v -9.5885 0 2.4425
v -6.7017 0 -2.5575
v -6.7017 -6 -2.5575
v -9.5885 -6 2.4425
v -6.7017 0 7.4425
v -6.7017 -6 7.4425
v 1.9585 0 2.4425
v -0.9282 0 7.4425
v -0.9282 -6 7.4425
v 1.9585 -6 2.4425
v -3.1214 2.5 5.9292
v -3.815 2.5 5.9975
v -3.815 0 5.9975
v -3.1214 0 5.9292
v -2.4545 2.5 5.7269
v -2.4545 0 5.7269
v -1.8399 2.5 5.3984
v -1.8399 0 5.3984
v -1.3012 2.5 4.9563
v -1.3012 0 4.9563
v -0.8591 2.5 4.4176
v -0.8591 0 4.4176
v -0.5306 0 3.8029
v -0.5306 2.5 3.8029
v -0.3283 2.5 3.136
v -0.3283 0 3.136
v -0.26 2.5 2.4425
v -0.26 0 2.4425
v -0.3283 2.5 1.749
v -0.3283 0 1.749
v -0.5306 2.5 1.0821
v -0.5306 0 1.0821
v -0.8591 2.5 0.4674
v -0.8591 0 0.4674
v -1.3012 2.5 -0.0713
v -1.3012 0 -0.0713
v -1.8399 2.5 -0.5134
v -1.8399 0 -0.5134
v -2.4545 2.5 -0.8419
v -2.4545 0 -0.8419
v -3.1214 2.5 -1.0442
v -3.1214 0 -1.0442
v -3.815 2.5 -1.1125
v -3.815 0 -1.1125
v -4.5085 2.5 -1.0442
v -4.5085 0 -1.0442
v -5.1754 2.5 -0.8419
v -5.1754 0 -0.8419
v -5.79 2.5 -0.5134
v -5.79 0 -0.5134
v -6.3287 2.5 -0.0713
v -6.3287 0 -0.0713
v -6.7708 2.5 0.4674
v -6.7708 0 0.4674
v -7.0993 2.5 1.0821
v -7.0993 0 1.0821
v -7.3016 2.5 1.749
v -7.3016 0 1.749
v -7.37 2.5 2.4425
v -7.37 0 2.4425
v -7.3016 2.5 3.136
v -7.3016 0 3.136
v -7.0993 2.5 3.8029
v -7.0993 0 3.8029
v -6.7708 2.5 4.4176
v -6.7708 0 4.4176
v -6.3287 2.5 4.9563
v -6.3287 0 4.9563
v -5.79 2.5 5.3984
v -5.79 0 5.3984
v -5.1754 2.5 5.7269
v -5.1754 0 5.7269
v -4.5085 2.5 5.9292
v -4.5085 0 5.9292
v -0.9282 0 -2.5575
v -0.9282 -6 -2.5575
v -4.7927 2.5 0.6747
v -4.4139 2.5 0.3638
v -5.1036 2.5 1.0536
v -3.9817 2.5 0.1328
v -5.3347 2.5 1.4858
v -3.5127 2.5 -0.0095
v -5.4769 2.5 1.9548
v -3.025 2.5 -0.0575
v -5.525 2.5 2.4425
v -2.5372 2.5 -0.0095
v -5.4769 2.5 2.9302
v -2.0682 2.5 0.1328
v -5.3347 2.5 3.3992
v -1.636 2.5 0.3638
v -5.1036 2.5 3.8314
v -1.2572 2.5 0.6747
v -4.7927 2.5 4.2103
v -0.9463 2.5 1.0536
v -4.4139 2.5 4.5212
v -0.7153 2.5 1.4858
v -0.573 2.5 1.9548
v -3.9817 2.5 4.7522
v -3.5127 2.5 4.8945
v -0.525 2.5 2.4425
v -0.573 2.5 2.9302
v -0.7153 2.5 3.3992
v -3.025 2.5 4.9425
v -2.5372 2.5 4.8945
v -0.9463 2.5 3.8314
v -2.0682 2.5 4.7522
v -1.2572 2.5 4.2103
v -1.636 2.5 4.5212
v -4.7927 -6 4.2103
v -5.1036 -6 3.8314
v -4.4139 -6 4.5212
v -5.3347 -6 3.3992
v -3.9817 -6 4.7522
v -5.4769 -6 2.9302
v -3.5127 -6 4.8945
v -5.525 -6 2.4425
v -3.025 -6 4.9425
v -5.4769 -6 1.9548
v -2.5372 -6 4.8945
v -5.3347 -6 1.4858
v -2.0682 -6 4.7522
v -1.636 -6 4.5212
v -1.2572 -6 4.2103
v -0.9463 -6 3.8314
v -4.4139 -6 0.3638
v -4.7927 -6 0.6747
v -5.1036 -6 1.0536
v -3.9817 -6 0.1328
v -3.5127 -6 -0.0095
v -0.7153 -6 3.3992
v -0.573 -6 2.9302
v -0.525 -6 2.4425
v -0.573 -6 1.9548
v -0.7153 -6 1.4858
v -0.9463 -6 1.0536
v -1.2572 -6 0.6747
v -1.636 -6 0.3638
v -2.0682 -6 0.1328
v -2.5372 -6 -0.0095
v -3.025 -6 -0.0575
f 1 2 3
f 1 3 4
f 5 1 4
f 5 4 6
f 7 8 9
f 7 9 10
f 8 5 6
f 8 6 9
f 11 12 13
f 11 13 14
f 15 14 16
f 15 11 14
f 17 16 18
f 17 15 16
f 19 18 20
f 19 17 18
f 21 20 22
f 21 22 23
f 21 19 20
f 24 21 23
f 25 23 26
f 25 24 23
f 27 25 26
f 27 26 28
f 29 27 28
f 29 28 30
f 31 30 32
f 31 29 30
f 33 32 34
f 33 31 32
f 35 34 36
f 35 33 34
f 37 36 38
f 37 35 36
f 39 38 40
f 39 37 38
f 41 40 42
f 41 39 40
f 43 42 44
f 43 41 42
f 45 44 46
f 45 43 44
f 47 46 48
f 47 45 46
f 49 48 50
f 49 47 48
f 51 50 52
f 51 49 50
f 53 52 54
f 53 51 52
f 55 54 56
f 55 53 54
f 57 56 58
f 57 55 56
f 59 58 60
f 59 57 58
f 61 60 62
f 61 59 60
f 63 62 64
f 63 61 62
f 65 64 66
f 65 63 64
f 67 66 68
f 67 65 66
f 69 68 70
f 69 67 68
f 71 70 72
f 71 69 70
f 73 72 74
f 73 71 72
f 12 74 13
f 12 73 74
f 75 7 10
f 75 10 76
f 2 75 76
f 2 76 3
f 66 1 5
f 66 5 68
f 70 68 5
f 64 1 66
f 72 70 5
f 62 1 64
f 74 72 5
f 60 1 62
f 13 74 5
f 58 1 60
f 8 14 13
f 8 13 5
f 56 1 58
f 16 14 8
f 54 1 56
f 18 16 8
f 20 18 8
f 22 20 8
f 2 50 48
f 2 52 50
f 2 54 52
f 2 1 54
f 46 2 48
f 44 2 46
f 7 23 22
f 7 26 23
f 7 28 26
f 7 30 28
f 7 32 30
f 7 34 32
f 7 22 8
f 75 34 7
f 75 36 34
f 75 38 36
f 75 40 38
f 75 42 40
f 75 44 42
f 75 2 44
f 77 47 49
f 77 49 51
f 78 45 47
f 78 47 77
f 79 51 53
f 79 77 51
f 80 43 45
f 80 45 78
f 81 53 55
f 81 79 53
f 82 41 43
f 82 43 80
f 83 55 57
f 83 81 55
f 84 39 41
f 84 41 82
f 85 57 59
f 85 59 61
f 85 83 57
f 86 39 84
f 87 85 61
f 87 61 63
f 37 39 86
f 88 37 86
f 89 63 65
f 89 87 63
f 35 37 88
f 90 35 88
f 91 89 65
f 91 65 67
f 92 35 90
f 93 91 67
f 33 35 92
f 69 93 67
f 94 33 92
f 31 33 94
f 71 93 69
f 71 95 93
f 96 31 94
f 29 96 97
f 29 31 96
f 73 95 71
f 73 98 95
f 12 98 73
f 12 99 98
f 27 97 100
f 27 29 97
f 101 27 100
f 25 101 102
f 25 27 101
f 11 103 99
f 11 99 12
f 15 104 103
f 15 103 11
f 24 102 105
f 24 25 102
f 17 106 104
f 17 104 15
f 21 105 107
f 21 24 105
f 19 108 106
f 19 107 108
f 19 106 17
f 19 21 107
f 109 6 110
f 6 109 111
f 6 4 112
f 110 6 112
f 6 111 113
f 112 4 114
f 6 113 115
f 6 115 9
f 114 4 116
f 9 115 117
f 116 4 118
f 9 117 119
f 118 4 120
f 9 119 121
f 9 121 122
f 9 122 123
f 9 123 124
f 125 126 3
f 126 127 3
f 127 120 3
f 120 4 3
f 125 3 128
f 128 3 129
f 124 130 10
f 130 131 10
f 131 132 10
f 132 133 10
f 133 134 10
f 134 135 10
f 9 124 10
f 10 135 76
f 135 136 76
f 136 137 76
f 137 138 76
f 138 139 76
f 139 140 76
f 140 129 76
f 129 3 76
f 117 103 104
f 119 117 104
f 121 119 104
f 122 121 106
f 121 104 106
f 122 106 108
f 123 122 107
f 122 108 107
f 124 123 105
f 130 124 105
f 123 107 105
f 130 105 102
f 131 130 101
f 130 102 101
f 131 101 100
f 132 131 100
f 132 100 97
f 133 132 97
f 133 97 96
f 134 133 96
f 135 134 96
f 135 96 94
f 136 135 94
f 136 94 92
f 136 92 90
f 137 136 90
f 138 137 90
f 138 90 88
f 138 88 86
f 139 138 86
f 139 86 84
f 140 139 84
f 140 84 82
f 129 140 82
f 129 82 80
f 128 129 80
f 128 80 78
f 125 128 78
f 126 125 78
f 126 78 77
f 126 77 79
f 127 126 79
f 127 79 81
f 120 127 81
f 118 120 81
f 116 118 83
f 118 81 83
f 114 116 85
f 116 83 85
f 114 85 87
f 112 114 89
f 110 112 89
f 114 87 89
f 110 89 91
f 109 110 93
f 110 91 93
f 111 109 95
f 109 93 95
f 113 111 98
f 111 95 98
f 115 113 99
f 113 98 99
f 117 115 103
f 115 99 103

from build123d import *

# Parameters (mm, degrees)
SKETCH_1_R      = 2.5
EXTRUDE_1_DEPTH = 6
EXTRUDE_START   = 2.5
SKETCH_1_3_R    = 3.555
SKETCH_1_3_R_2  = 2.5
EXTRUDE_2_DEPTH = 2.5


with BuildPart() as part:
    # Эскиз1 → Бобышка-Вытянуть1 (new body)
    with BuildSketch(Plane(origin=(0, 0, 0), x_dir=(1, 0, 0), z_dir=(0, 1, 0))):
        Polygon((1.958548395, -2.442501227), (-0.928202951, 2.557498773), (-6.701705643, 2.557498773), (-9.588456989, -2.442501227), (-6.701705643, -7.442501227), (-0.928202951, -7.442501227), align=None)
        with Locations((-3.024954297, -2.442501227)):
            Circle(SKETCH_1_R, mode=Mode.SUBTRACT)
    extrude(amount=-EXTRUDE_1_DEPTH)

    # Эскиз1<3> → Бобышка-Вытянуть2 (add)
    with BuildSketch(Plane(origin=(0, 0, 0), x_dir=(1, 0, 0), z_dir=(0, 1, 0)).offset(EXTRUDE_START)):
        with Locations((-3.814954297, -2.442501227)):
            Circle(SKETCH_1_3_R)
        with Locations((-3.024954297, -2.442501227)):
            Circle(SKETCH_1_3_R_2, mode=Mode.SUBTRACT)
    extrude(amount=-EXTRUDE_2_DEPTH)


solid = part.part
